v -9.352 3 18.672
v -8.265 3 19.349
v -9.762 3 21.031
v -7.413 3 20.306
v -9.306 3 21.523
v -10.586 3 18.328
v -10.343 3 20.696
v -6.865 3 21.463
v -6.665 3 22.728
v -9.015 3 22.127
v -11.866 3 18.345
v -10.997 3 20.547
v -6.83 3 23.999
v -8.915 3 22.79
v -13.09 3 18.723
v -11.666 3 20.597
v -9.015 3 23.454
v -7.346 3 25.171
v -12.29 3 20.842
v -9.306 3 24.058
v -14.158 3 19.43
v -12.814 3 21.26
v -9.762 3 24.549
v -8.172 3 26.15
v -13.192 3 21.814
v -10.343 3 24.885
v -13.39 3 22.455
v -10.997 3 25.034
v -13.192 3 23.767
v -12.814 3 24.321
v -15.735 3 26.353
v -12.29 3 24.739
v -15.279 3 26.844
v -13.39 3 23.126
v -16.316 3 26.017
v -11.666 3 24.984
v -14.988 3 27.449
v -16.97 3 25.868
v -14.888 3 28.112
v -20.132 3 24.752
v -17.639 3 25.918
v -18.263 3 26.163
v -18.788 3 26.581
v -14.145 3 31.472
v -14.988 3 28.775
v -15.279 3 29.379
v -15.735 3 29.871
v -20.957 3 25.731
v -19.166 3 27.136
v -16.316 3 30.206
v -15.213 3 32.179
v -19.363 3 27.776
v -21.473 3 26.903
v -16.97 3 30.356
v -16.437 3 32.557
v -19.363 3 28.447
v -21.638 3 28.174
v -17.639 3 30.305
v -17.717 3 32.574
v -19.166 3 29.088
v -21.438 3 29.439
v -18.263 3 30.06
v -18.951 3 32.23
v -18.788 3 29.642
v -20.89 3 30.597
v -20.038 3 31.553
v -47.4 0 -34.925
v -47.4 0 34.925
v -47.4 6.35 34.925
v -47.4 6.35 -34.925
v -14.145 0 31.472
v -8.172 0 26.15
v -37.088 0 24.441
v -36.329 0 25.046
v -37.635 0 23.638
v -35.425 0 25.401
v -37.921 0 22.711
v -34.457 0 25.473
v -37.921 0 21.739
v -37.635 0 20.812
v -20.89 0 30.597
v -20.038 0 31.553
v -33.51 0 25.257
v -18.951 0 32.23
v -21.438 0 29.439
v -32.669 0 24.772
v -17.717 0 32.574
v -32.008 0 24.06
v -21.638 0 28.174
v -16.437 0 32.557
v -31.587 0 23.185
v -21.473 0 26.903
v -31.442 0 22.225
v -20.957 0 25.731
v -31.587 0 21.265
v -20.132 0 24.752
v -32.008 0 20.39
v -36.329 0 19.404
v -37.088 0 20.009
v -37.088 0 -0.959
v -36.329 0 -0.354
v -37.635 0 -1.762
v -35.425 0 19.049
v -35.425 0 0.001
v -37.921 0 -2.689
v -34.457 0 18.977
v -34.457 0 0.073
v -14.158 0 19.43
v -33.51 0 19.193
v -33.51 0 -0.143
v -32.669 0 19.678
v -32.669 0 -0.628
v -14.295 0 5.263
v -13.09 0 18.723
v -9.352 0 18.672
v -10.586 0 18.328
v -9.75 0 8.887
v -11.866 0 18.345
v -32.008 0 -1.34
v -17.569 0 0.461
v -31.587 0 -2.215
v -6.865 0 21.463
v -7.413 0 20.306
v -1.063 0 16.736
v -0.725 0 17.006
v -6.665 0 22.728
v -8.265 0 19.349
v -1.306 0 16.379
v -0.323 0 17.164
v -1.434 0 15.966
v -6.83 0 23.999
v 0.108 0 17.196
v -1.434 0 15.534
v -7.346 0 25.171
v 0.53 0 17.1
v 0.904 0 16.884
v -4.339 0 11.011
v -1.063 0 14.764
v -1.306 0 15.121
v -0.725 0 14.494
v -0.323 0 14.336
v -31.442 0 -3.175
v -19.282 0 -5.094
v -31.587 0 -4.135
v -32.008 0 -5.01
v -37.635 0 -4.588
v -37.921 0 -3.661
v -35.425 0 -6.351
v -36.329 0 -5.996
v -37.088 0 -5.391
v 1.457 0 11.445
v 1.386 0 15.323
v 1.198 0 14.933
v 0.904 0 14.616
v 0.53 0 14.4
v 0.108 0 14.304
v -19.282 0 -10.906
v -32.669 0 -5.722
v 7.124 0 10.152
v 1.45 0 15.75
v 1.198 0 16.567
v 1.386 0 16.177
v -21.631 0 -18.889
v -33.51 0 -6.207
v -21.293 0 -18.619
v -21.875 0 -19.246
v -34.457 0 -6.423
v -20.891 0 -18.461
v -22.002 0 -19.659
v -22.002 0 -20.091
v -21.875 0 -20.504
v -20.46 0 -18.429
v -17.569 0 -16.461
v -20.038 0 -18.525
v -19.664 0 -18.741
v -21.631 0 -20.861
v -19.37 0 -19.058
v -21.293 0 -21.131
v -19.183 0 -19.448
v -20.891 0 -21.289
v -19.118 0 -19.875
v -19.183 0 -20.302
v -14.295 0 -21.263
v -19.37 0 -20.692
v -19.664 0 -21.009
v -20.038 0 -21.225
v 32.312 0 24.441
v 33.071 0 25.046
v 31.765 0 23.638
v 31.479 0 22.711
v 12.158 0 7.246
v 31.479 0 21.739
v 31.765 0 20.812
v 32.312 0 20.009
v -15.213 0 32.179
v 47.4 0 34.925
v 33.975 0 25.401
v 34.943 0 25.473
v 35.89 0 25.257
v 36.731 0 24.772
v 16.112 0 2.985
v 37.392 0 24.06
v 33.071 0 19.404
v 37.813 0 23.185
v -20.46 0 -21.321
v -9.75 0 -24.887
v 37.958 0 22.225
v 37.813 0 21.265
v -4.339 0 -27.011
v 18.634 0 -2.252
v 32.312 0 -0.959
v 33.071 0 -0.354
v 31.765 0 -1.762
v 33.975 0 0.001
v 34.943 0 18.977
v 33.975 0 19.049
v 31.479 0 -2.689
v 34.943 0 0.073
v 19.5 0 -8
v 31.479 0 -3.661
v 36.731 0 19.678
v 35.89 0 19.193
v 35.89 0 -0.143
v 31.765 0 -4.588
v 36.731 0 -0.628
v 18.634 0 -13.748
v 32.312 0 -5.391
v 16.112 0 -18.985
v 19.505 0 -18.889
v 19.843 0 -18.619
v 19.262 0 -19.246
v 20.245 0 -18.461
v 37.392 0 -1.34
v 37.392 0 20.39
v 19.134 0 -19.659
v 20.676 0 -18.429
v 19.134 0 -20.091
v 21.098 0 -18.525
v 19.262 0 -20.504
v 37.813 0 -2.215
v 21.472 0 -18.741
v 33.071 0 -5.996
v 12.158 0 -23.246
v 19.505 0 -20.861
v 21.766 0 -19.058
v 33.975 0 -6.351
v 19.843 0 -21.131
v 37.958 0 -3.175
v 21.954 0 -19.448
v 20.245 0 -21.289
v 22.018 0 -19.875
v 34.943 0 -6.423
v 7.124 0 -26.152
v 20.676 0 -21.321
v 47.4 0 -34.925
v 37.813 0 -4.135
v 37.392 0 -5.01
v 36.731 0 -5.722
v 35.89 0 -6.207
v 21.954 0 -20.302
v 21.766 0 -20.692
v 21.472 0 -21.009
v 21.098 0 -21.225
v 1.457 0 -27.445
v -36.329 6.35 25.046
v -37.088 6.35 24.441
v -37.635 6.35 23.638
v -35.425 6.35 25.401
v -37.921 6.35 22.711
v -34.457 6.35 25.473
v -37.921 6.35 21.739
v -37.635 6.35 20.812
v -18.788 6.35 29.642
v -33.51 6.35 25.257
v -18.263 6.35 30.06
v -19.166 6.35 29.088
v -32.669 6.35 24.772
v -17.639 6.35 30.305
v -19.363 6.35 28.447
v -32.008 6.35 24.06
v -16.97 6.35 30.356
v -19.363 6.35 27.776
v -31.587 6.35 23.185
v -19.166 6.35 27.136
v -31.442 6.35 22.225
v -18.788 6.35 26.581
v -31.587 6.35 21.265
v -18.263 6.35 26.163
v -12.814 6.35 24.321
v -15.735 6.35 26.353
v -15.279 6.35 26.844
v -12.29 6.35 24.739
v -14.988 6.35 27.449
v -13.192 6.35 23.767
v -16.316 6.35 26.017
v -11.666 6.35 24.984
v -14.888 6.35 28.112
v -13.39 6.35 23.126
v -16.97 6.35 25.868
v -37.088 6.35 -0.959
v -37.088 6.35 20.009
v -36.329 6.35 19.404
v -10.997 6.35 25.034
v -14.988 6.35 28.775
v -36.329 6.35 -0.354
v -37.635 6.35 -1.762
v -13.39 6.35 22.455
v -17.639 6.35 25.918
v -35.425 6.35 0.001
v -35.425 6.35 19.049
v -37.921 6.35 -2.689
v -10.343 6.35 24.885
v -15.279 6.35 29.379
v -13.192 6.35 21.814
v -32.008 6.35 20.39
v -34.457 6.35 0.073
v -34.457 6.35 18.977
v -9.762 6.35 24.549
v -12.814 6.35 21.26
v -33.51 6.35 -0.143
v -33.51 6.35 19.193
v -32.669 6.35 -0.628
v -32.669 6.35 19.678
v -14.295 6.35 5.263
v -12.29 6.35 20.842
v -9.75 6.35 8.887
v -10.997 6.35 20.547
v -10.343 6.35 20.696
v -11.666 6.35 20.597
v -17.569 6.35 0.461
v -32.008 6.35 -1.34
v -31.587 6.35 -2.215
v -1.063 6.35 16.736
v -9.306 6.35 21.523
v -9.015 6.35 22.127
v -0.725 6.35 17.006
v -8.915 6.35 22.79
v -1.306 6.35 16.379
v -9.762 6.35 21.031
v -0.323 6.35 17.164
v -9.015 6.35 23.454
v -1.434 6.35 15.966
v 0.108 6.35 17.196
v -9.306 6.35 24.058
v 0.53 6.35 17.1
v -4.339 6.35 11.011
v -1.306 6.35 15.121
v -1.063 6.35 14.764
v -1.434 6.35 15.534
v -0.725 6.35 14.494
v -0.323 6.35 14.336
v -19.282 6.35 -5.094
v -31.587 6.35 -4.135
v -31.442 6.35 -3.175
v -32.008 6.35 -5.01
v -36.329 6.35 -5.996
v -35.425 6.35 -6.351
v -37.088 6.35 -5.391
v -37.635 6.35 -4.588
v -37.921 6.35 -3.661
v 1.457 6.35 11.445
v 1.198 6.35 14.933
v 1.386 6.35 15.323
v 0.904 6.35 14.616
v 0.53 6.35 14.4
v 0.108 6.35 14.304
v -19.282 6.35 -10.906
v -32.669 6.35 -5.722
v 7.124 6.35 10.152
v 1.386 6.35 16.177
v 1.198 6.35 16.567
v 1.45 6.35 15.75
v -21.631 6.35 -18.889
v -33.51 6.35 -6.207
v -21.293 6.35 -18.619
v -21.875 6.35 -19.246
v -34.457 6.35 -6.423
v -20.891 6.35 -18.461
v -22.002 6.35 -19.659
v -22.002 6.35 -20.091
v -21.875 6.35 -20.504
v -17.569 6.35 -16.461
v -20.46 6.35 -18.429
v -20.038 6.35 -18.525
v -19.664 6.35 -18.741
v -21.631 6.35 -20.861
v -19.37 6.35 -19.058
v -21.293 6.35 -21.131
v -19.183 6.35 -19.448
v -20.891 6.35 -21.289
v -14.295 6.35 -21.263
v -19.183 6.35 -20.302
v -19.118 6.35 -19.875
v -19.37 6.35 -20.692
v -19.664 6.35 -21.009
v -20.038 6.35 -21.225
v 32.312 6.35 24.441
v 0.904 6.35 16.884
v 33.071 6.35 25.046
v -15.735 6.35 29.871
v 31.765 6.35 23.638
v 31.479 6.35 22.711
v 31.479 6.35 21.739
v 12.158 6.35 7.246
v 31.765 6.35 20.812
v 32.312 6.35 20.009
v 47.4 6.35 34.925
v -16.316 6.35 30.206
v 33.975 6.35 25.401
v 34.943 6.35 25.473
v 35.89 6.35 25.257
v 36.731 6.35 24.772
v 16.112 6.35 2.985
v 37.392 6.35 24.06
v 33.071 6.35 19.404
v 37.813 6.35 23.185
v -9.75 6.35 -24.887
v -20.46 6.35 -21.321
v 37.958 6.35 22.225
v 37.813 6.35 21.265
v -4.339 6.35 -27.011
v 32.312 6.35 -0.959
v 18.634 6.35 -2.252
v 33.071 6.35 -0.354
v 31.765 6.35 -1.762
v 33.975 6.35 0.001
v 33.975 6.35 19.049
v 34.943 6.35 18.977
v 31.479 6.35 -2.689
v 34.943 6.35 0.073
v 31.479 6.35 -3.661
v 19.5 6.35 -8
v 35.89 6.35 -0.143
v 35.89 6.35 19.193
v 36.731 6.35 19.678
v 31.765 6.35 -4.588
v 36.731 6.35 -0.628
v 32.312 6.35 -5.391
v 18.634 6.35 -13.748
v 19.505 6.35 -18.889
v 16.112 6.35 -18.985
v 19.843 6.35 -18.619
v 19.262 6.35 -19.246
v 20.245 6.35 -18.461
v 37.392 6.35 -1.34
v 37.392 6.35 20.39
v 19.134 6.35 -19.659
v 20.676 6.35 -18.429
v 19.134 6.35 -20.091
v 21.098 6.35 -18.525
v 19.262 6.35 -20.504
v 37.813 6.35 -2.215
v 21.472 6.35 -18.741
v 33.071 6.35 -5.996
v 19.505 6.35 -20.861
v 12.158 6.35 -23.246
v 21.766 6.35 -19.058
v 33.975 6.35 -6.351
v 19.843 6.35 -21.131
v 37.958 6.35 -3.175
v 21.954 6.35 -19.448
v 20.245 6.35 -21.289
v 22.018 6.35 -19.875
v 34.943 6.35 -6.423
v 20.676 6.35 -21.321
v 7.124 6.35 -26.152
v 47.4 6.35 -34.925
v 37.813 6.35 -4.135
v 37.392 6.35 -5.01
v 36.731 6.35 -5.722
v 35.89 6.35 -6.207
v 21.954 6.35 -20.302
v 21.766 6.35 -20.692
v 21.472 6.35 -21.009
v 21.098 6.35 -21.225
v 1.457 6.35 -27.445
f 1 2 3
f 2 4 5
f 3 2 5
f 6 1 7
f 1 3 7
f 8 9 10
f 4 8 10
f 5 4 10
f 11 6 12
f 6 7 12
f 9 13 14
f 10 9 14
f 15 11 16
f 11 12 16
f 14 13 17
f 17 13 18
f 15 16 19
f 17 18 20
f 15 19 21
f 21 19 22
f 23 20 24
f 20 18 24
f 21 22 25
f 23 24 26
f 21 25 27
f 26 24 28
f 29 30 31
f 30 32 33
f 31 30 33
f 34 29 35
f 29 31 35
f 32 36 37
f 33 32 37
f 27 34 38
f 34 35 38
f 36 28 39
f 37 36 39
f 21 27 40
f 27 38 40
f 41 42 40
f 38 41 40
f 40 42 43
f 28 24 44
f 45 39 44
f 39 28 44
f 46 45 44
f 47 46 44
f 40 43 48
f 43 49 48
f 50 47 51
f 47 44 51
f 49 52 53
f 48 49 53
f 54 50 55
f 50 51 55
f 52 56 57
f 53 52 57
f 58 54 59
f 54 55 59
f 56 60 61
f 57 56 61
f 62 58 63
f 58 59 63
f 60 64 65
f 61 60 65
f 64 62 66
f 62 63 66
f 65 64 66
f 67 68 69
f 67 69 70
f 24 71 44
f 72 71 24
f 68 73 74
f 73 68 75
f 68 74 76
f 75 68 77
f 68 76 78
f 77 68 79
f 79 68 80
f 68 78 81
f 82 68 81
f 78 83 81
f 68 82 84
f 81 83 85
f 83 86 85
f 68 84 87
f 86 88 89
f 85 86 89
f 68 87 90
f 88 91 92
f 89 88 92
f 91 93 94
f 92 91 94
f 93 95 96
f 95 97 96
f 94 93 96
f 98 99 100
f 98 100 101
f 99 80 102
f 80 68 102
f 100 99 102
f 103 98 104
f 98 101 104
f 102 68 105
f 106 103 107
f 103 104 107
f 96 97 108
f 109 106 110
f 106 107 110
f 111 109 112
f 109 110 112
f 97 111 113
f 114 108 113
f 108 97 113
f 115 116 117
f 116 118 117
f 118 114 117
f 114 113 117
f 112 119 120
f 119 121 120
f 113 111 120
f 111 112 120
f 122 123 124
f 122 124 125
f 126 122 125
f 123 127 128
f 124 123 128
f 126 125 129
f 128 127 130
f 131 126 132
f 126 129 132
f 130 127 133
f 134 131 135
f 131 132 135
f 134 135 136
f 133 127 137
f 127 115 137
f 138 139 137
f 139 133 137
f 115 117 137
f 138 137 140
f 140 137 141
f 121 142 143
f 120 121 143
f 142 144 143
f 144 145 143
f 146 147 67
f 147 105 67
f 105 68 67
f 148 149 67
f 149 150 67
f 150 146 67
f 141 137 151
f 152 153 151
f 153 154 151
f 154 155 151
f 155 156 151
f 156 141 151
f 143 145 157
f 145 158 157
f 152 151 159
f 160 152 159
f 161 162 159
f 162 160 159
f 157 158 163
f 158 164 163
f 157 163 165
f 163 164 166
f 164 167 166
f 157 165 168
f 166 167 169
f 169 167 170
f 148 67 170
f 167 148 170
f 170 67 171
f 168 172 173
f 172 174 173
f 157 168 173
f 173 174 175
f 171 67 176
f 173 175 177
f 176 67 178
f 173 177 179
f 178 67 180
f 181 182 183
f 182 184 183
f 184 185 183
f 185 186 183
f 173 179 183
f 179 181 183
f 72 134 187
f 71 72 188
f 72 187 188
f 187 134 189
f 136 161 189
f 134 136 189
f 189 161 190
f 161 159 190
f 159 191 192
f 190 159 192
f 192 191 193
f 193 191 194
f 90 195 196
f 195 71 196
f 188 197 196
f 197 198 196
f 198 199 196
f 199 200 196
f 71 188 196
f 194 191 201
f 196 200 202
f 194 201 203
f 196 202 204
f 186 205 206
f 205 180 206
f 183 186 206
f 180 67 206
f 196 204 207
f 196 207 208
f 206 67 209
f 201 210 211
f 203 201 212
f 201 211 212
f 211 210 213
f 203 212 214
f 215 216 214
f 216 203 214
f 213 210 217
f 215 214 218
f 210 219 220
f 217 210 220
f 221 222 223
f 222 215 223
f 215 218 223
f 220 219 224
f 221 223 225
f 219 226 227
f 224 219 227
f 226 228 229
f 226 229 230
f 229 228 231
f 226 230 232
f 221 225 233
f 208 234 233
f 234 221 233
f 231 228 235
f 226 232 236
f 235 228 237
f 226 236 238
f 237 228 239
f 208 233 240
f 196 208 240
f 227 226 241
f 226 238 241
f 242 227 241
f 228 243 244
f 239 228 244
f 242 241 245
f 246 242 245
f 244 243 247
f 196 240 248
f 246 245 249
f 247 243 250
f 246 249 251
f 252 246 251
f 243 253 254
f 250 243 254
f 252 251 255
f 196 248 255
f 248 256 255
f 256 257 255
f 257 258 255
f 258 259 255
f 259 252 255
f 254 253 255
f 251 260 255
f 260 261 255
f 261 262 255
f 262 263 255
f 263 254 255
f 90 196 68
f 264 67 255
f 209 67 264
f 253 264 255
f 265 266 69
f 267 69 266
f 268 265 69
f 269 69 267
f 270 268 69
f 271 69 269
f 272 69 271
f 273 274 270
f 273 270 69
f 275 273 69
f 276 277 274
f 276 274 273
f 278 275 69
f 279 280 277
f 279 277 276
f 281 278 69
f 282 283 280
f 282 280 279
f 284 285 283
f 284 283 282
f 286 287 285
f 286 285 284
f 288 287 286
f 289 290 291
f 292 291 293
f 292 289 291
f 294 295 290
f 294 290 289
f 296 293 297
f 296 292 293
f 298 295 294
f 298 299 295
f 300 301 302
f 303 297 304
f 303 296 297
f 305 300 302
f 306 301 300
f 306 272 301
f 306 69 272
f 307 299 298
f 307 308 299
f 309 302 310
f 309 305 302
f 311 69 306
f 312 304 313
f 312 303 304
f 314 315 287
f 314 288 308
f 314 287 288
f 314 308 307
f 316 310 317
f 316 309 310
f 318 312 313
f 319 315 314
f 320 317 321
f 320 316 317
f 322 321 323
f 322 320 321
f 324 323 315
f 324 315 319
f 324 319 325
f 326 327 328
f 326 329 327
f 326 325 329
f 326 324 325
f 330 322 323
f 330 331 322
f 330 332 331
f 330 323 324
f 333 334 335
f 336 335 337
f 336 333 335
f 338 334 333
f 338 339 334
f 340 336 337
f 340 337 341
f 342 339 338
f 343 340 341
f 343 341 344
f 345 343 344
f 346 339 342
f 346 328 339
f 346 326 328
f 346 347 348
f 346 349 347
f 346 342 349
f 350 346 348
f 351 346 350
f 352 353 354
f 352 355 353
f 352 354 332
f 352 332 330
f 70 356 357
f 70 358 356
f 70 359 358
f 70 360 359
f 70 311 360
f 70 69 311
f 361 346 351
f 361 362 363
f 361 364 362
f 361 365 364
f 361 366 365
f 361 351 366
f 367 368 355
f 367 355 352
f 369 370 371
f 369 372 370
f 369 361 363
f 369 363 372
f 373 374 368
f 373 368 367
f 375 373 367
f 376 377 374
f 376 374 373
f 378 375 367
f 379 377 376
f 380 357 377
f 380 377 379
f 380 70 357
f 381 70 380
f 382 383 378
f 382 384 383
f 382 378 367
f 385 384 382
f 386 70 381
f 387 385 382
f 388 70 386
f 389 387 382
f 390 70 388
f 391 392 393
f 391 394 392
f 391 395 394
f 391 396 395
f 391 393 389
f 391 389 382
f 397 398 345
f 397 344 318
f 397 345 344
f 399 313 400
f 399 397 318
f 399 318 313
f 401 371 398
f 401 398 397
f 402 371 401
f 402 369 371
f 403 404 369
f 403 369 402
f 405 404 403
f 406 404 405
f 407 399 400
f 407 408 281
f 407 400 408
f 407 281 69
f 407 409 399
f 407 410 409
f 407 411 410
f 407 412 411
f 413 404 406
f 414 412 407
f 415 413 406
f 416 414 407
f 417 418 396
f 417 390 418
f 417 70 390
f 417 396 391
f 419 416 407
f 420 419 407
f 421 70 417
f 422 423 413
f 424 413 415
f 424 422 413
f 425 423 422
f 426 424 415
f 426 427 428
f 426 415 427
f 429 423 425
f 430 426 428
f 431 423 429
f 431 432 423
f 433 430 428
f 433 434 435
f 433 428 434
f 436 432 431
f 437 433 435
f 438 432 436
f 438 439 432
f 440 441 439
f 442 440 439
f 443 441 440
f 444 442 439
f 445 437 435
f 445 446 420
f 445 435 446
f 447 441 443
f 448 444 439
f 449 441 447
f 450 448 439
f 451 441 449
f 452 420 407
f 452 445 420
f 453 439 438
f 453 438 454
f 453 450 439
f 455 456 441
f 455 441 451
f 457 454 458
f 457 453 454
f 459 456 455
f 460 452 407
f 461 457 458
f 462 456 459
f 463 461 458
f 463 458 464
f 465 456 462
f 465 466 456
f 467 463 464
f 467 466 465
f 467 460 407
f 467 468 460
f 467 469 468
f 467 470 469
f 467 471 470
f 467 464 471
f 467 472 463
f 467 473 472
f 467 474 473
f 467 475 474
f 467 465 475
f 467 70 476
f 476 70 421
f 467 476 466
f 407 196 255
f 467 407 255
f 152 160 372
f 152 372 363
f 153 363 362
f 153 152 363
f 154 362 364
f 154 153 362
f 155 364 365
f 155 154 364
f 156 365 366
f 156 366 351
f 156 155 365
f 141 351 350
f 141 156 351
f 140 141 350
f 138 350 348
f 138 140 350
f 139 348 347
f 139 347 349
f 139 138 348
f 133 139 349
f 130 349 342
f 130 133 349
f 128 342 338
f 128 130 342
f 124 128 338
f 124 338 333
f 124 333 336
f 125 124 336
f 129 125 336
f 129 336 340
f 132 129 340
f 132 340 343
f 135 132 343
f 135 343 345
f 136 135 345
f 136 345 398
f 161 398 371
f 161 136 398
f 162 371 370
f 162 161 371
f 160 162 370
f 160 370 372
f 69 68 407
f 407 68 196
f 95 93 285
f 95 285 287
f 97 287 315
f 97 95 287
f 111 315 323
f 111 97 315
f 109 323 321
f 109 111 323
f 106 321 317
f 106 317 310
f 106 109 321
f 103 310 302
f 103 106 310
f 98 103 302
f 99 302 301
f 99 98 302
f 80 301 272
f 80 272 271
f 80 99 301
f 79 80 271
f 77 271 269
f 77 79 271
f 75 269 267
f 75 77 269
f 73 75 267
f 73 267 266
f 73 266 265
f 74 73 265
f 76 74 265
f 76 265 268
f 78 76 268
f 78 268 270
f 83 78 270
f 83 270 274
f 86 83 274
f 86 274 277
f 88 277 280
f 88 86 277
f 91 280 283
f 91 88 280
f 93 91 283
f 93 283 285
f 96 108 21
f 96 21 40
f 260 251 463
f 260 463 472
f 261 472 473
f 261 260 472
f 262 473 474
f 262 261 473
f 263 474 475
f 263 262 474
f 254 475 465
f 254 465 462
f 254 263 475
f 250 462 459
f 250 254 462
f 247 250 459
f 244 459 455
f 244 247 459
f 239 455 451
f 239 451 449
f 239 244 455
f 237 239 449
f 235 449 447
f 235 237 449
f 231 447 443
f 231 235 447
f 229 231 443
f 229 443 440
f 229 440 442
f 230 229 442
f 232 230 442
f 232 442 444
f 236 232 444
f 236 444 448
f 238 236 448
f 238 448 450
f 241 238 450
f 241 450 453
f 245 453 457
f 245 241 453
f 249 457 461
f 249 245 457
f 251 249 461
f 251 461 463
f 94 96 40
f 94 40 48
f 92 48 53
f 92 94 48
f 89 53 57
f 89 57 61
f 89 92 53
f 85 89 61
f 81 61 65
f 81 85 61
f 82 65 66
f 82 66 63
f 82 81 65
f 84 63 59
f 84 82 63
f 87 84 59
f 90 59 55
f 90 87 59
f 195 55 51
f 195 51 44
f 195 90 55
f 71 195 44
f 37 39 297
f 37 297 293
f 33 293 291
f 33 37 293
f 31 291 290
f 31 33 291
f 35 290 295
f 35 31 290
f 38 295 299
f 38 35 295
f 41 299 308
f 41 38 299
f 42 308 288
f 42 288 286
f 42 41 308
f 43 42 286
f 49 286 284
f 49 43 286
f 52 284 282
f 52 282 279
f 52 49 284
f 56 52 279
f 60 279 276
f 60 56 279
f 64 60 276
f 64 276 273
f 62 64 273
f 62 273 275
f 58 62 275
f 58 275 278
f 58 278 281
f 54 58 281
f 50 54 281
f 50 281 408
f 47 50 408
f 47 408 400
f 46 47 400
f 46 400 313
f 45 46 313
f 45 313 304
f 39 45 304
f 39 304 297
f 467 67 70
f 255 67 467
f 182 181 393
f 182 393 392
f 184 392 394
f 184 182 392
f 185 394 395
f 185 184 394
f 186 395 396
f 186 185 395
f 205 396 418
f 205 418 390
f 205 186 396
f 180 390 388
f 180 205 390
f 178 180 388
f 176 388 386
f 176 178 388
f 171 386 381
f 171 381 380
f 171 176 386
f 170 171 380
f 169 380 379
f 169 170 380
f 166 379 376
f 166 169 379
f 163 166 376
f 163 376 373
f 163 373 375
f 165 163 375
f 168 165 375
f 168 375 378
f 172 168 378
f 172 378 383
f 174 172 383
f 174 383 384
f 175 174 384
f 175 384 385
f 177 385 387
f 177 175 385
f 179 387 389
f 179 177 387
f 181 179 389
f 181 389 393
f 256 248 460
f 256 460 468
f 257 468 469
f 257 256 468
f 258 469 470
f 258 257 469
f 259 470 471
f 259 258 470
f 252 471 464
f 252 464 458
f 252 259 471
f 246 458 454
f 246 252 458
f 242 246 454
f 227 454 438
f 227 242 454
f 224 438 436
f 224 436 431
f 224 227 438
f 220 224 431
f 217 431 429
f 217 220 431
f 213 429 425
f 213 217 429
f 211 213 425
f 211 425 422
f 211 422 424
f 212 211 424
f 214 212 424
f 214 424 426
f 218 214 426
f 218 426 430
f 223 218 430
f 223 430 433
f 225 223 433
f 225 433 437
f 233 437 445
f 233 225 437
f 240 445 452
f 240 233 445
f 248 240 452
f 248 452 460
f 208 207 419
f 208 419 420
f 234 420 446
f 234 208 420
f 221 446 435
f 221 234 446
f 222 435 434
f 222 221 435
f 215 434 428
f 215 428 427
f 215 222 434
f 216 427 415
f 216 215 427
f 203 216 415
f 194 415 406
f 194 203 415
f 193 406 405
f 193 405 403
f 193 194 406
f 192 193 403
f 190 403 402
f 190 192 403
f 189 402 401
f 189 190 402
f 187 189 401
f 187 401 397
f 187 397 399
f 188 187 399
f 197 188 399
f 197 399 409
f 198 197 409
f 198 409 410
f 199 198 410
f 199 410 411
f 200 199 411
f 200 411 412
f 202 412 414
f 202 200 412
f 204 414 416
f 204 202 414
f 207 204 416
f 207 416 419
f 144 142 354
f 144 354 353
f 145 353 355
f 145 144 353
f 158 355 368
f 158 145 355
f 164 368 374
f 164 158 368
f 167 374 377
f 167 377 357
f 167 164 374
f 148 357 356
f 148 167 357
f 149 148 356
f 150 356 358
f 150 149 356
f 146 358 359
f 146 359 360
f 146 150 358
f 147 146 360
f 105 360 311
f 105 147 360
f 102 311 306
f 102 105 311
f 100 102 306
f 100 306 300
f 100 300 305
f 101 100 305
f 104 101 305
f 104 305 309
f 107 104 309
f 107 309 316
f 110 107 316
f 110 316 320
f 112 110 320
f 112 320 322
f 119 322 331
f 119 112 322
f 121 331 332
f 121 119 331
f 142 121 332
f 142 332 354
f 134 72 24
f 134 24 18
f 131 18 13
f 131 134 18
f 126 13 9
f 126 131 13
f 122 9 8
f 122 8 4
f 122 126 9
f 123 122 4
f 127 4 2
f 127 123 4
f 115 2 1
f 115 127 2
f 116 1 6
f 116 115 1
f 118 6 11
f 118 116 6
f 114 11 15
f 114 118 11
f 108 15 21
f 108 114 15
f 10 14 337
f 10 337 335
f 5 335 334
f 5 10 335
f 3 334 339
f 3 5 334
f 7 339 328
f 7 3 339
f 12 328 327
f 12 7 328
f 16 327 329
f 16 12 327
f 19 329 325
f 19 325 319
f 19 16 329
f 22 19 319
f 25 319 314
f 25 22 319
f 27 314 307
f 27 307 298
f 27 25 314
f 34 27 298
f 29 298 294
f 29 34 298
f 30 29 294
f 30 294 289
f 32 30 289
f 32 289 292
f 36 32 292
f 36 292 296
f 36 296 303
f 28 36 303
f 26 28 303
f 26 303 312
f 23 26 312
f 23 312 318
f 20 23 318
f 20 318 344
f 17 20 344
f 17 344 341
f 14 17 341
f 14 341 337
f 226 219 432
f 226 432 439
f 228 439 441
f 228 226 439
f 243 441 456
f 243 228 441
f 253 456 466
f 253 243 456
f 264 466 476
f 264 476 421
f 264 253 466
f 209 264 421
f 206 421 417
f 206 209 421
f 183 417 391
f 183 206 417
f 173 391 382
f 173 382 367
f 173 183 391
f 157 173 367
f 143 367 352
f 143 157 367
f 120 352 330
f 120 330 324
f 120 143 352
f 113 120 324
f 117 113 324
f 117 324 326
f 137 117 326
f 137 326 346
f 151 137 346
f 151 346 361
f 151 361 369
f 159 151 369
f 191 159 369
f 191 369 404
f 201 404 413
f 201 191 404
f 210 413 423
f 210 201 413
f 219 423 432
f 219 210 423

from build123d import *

# Parameters (mm, degrees)
SKETCH1_W           = 94.8
SKETCH1_H           = 69.85
SKETCH1_R           = 2.25
SKETCH1_R_2         = 1.45
SKETCH1_R_3         = 3.25755
SKETCH1_R_4         = 19.5
BOSS_EXTRUDE1_DEPTH = 6.35
CUT_EXTRUDE2_DEPTH  = 3


with BuildPart() as part:
    # Sketch1 → Boss-Extrude1 (new body)
    with BuildSketch(Plane(origin=(0, 0, 0), x_dir=(1, 0, 0), z_dir=(0, 1, 0))):
        Rectangle(SKETCH1_W, SKETCH1_H)
        with Locations((-17.138337536, -28.111820997)):
            Circle(SKETCH1_R, mode=Mode.SUBTRACT)
        with Locations((20.56810334, 19.875)):
            Circle(SKETCH1_R_2, mode=Mode.SUBTRACT)
        with Locations((-20.56810334, 19.875)):
            Circle(SKETCH1_R_2, mode=Mode.SUBTRACT)
        with Locations((0, -15.75)):
            Circle(SKETCH1_R_2, mode=Mode.SUBTRACT)
        with Locations((34.7, 3.175)):
            Circle(SKETCH1_R_3, mode=Mode.SUBTRACT)
        with Locations((-34.7, 3.175)):
            Circle(SKETCH1_R_3, mode=Mode.SUBTRACT)
        with Locations((0, 8)):
            Circle(SKETCH1_R_4, mode=Mode.SUBTRACT)
        with Locations((-11.164910261, -22.79033938)):
            Circle(SKETCH1_R, mode=Mode.SUBTRACT)
        with Locations((-34.7, -22.225)):
            Circle(SKETCH1_R_3, mode=Mode.SUBTRACT)
        with Locations((34.7, -22.225)):
            Circle(SKETCH1_R_3, mode=Mode.SUBTRACT)
    extrude(amount=BOSS_EXTRUDE1_DEPTH)

    # Sketch4 → Cut-Extrude2 (cut)
    with BuildSketch(Plane.XZ):
        with BuildLine():
            Line((-14.145004126, 31.471873838), (-8.171576852, 26.150392222))
            ThreePointArc((-8.171576852, 26.150392222), (-7.804857419, 19.797005971), (-14.15824367, 19.430286538))
            Line((-14.15824367, 19.430286538), (-20.131670945, 24.751768155))
            ThreePointArc((-20.131670945, 24.751768155), (-20.498390378, 31.105154406), (-14.145004126, 31.471873838))
        make_face()
    extrude(amount=-CUT_EXTRUDE2_DEPTH, mode=Mode.SUBTRACT)


solid = part.part
